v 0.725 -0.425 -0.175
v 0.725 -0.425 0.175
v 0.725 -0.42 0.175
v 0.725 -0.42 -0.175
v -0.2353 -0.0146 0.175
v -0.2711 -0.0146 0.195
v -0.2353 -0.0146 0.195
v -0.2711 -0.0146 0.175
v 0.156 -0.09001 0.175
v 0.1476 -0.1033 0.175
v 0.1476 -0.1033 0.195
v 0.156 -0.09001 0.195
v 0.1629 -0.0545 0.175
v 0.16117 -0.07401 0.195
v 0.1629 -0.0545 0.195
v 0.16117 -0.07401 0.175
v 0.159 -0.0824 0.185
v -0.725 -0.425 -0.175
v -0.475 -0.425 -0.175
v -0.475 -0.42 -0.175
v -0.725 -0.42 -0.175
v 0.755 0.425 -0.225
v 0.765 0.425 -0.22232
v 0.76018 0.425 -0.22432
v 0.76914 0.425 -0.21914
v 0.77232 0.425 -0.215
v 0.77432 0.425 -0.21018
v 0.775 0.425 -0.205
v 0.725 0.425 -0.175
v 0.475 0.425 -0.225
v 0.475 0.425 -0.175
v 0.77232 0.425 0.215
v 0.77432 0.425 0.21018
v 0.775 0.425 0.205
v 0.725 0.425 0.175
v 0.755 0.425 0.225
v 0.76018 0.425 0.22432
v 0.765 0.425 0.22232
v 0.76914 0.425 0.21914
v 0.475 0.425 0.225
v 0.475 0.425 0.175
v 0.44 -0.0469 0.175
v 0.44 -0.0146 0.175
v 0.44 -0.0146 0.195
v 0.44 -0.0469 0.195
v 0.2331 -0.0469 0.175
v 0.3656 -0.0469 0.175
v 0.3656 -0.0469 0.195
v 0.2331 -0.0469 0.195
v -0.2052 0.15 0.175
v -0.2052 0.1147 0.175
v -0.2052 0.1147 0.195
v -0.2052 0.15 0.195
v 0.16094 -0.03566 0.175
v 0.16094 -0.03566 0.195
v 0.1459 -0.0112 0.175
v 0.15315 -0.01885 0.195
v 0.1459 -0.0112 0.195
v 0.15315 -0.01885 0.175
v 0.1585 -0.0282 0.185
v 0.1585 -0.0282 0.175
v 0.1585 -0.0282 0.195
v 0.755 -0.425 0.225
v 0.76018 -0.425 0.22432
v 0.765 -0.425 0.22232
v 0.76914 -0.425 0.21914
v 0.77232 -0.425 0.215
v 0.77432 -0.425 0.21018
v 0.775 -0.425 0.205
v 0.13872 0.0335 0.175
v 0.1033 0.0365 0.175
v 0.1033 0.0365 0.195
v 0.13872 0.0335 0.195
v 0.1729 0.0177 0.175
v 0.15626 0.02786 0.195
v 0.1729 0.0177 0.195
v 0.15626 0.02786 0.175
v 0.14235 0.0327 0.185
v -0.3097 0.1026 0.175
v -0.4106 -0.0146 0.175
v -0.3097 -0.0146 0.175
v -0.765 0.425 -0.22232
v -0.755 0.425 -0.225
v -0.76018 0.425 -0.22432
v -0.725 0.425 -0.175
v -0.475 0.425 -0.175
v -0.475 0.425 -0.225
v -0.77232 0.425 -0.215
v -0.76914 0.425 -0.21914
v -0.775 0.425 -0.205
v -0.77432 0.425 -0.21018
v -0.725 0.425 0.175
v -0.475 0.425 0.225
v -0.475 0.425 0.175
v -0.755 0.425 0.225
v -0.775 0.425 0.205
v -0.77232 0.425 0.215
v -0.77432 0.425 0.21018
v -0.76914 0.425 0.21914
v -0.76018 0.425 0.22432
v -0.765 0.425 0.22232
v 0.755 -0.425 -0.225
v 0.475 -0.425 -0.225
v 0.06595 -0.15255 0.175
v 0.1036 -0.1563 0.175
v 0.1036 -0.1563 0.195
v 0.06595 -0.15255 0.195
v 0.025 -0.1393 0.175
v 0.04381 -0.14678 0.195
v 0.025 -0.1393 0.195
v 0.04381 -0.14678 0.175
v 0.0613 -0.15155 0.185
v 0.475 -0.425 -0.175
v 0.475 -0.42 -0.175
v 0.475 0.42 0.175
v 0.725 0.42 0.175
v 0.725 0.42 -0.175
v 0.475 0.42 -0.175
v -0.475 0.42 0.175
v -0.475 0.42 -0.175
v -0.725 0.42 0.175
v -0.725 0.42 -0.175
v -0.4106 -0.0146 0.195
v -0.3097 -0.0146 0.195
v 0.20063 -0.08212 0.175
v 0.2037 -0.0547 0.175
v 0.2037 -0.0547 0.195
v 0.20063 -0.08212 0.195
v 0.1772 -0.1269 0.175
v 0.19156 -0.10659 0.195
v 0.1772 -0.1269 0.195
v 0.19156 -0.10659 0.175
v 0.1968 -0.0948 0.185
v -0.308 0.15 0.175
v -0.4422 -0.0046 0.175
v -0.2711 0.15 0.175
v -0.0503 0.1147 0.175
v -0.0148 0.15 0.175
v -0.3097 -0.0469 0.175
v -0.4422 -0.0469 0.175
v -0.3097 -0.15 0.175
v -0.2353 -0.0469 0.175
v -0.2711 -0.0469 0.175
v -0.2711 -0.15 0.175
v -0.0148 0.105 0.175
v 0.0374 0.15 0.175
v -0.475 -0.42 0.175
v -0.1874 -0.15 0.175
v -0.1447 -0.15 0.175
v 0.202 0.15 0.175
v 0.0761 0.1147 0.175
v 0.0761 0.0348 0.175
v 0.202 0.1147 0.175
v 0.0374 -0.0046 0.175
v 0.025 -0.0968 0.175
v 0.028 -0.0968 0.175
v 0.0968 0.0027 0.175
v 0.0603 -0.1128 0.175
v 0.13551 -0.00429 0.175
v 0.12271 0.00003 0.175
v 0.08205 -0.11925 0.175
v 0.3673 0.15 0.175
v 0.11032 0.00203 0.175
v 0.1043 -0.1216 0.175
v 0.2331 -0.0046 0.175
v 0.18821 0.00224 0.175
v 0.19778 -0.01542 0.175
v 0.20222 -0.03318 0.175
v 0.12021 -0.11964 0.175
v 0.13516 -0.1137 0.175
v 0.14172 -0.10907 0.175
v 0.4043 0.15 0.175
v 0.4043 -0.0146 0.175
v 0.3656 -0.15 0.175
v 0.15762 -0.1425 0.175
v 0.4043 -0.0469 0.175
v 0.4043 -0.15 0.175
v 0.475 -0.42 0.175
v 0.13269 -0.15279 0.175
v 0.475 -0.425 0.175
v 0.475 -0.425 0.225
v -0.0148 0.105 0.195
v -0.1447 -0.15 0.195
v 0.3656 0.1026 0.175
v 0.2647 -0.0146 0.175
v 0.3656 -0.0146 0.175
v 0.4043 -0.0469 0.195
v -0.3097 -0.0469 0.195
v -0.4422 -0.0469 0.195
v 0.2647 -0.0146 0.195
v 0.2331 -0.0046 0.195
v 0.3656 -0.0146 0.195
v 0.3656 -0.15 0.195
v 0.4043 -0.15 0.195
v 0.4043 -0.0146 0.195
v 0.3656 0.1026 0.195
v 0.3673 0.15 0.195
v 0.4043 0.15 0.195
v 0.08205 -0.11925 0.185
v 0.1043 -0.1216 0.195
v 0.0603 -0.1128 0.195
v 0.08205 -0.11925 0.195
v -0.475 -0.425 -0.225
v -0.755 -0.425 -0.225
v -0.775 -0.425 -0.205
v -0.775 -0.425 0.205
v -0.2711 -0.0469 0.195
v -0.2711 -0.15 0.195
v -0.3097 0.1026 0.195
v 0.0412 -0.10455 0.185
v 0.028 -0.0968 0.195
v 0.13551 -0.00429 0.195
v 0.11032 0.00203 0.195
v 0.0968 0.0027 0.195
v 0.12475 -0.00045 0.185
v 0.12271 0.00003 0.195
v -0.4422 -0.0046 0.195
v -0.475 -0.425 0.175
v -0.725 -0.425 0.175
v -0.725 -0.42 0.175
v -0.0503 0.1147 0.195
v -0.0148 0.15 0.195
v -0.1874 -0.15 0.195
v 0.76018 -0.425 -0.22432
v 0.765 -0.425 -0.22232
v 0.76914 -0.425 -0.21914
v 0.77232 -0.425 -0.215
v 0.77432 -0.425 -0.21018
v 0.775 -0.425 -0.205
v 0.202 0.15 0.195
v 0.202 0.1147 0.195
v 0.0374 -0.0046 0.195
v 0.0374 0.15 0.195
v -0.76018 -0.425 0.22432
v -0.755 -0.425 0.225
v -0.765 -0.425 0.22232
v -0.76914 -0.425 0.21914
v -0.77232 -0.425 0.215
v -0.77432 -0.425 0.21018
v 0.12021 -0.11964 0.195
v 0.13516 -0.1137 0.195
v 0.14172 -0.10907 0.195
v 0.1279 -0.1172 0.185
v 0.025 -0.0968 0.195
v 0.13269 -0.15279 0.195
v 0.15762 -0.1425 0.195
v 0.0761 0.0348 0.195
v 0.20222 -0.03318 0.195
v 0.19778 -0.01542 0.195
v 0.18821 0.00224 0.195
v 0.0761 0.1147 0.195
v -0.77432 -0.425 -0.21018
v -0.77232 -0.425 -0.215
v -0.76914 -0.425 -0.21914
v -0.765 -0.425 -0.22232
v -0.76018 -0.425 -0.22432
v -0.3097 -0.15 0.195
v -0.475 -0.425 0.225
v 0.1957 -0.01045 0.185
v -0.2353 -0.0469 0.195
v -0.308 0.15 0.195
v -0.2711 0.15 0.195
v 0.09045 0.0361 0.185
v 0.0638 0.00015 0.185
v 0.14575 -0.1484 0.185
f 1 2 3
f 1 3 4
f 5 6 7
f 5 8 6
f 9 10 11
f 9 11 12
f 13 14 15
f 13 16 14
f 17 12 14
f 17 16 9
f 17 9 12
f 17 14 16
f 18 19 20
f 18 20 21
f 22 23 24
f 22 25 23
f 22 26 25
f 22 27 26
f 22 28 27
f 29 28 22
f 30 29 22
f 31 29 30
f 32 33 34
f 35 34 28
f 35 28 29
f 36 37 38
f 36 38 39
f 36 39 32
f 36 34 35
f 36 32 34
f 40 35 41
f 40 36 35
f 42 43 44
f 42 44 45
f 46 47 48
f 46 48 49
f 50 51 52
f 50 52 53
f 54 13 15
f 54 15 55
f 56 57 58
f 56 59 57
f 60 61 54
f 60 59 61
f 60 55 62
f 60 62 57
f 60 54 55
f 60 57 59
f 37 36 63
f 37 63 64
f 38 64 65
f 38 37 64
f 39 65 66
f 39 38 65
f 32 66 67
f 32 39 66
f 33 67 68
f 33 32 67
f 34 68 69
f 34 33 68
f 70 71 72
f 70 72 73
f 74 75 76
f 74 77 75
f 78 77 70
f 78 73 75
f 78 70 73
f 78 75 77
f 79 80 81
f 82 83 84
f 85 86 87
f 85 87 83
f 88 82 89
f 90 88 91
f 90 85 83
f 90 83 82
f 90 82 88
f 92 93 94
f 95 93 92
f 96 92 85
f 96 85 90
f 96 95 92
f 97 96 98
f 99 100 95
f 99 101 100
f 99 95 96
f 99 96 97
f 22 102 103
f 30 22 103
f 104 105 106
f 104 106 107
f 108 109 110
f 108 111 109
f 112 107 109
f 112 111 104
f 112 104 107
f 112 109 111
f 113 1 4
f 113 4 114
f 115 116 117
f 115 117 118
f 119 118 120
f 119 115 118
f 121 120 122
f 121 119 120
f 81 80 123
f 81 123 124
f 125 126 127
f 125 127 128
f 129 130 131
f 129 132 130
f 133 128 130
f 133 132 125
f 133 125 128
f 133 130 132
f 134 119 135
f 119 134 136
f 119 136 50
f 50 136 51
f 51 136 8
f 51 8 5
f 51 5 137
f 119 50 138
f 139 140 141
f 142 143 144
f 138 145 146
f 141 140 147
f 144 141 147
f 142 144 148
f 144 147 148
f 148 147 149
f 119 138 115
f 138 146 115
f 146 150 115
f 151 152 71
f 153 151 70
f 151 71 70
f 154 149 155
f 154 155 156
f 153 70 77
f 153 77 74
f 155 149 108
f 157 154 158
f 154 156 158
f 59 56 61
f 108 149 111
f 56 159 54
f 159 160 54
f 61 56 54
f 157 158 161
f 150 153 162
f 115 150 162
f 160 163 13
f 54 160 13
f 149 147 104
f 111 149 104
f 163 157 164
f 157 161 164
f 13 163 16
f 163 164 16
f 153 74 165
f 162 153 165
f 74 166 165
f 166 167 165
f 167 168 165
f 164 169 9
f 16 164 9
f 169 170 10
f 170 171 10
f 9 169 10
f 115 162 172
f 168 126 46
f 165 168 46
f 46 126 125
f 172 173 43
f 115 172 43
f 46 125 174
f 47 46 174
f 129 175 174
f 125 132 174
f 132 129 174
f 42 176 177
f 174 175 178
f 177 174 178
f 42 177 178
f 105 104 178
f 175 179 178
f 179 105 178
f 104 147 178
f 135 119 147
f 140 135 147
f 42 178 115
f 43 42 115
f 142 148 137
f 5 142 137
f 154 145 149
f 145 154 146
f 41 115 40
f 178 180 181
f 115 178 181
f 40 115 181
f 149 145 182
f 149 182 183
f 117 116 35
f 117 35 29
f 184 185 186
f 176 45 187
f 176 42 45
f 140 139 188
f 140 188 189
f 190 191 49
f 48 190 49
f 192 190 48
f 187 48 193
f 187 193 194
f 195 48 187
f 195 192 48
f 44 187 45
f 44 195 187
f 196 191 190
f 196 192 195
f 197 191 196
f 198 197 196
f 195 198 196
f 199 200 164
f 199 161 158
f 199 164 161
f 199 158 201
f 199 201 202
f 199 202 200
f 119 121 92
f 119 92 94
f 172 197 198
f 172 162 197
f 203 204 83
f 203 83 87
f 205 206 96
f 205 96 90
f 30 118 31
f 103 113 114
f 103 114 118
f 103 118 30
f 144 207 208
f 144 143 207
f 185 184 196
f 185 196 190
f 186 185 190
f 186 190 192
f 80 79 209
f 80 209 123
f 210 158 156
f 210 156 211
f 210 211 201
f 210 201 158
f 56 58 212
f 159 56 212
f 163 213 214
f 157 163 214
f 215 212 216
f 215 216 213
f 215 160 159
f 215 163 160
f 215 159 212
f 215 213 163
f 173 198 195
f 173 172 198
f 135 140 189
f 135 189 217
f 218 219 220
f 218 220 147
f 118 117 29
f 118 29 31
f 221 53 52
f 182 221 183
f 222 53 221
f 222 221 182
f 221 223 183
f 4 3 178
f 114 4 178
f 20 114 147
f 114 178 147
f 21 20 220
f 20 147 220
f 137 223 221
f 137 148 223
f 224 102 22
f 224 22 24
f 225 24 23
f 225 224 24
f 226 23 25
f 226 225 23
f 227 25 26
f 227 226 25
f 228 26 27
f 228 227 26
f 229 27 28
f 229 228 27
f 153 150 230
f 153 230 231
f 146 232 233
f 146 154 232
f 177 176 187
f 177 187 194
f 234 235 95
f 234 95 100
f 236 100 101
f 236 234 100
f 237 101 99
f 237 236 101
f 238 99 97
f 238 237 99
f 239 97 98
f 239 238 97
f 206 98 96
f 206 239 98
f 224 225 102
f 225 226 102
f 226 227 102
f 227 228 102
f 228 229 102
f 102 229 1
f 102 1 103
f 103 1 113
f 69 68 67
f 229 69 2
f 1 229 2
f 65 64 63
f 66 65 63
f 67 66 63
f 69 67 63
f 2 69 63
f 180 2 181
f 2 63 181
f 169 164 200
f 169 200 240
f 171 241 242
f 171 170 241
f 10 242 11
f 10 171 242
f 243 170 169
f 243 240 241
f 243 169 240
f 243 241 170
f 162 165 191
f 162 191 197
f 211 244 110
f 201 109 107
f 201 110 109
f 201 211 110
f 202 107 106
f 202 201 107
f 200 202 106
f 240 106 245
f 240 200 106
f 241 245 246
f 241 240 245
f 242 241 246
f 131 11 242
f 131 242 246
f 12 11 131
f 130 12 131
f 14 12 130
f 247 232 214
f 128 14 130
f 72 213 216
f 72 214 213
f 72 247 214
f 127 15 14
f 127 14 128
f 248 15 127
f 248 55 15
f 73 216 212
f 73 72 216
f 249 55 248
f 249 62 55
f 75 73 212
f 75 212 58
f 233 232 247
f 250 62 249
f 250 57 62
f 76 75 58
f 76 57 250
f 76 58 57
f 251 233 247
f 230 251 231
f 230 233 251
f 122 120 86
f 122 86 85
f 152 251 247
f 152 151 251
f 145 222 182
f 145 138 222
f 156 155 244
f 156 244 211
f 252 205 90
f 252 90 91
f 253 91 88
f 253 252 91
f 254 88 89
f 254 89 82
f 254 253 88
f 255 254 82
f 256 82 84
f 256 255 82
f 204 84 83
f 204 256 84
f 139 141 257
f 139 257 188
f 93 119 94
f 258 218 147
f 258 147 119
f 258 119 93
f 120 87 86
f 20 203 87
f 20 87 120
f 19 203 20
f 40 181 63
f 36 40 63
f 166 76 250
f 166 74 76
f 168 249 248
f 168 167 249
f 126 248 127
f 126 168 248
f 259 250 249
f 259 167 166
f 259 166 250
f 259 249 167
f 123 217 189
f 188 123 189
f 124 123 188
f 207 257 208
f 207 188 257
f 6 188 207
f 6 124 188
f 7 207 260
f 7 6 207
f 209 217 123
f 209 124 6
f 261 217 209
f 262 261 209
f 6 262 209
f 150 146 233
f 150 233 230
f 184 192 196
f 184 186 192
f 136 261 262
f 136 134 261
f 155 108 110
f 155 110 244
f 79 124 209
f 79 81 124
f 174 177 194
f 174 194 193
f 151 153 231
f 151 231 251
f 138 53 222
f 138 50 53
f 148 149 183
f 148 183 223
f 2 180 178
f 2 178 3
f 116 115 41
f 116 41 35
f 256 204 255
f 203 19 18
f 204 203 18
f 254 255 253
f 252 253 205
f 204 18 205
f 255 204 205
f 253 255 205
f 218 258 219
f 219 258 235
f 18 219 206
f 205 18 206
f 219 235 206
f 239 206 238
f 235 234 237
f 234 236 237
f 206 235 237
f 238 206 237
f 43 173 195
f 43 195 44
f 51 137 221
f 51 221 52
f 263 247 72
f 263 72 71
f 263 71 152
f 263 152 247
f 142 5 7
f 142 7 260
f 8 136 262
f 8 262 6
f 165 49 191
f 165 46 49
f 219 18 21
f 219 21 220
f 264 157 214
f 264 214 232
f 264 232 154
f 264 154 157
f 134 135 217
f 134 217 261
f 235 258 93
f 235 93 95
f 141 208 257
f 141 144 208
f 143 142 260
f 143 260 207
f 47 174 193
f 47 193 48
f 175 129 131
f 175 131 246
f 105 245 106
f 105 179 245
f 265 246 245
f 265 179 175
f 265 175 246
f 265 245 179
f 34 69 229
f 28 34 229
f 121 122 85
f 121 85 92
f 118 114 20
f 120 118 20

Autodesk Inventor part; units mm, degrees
ref_plane "YZ Plane" through (0, 0, 0) normal (1, 0, 0) x (0, 1, 0)
ref_plane "XZ Plane" through (0, 0, 0) normal (0, 1, 0) x (-1, 0, 0)
ref_plane "XY Plane" through (0, 0, 0) normal (0, 0, 1) x (1, 0, 0)
sketch "Sketch1" plane through (0, 0, 0) normal (0, 1, 0) x (-1, 0, 0)
  line L0 (0.725, 0.175) -> (-0.725, 0.175)
  line L1 (-0.725, 0.175) -> (-0.725, -0.175)
  line L2 (-0.725, -0.175) -> (0.725, -0.175)
  line L3 (0.725, -0.175) -> (0.725, 0.175)
  line L4 (0.475, 0.175) -> (0.475, 0.225)
  line L5 (0.475, 0.225) -> (0.775, 0.225)
  line L6 (0.775, 0.225) -> (0.775, -0.225)
  line L7 (0.775, -0.225) -> (0.475, -0.225)
  line L8 (0.475, -0.225) -> (0.475, -0.175)
  line L9 (-0.475, 0.175) -> (-0.475, 0.225)
  line L10 (-0.475, 0.225) -> (-0.775, 0.225)
  line L11 (-0.775, 0.225) -> (-0.775, -0.225)
  line L12 (-0.775, -0.225) -> (-0.475, -0.225)
  line L13 (-0.475, -0.175) -> (-0.475, -0.225)
  line L14 (0.475, 0.175) -> (-0.475, 0.175)
  point P0 (0, 0)
  point P1 (0, 0.175)
  point P2 (0.725, 0)
  dimension "d0" = 1.55
  dimension "d1" = 0.05
  dimension "d2" = 0.05
  dimension "d3" = 0.45
  dimension "d4" = 0.3
extrude "Extrusion1" add sketch "Sketch1" along normal mid plane 0.85 contours L0 L4 L5 L6 L7 L8 L2 L3 | L0 L1 L2 L13 L12 L11 L10 L9
extrude "Extrusion2" add sketch "Sketch1" along normal mid plane 0.84 contours L3 L2 L1 L0
sketch "Sketch2" plane through (-0.475, -0.42, 0.175) normal (0, 0, 1) x (1, 0, 0)
  line L0 (0, 0) -> (0, 0.84) projected
  line L1 (0.95, 0) -> (0, 0) projected
  line L2 (0.95, 0) -> (0.95, 0.84) projected
  line L3 (0, 0.84) -> (0.95, 0.84) projected
  line L4 (0, 0.42) -> (0.95, 0.42) construction
  line L5 (0.2397, 0.3731) -> (0.2039, 0.3731)
  line L6 (0.2039, 0.3731) -> (0.2039, 0.27)
  line L7 (0.2039, 0.27) -> (0.1653, 0.27)
  line L8 (0.1653, 0.27) -> (0.1653, 0.3731)
  line L9 (0.1653, 0.3731) -> (0.0328, 0.3731)
  line L10 (0.0328, 0.3731) -> (0.0328, 0.4154)
  line L11 (0.0328, 0.4154) -> (0.167, 0.57)
  line L12 (0.167, 0.57) -> (0.2039, 0.57)
  line L13 (0.2039, 0.57) -> (0.2039, 0.4054)
  line L14 (0.2039, 0.4054) -> (0.2397, 0.4054)
  line L15 (0.2397, 0.4054) -> (0.2397, 0.3731)
  line L16 (0.1653, 0.4054) -> (0.1653, 0.5226)
  line L17 (0.1653, 0.5226) -> (0.0644, 0.4054)
  line L18 (0.0644, 0.4054) -> (0.1653, 0.4054)
  line L19 (0.4602, 0.525) -> (0.3303, 0.27)
  line L20 (0.3303, 0.27) -> (0.2876, 0.27)
  line L21 (0.2876, 0.27) -> (0.4247, 0.5347)
  line L22 (0.4247, 0.5347) -> (0.2698, 0.5347)
  line L23 (0.2698, 0.5347) -> (0.2698, 0.57)
  line L24 (0.2698, 0.57) -> (0.4602, 0.57)
  line L25 (0.4602, 0.57) -> (0.4602, 0.525)
  spline S0 degree 2 poles (0.6787, 0.3653) (0.6787, 0.3437) (0.6649, 0.3067) (0.6522, 0.2931) knots 0 0 0 1 2 2 2
  spline S1 degree 2 poles (0.6522, 0.2931) (0.6396, 0.2795) (0.6019, 0.2637) (0.5786, 0.2637) knots 0 0 0 1 2 2 2
  spline S2 degree 2 poles (0.5786, 0.2637) (0.5572, 0.2637) (0.5154, 0.2732) (0.5, 0.2807) knots 0 0 0 1 2 2 2
  line L26 (0.5, 0.2807) -> (0.5, 0.3232)
  line L27 (0.5, 0.3232) -> (0.503, 0.3232)
  spline S3 degree 2 poles (0.503, 0.3232) (0.5076, 0.3198) (0.5248, 0.3111) (0.5353, 0.3072) knots 0 0 0 1 2 2 2
  spline S4 degree 2 poles (0.5353, 0.3072) (0.5472, 0.3031) (0.5669, 0.2984) (0.5793, 0.2984) knots 0 0 0 1 2 2 2
  spline S5 degree 2 poles (0.5793, 0.2984) (0.5915, 0.2984) (0.6143, 0.3072) (0.6226, 0.3167) knots 0 0 0 1 2 2 2
  spline S6 degree 2 poles (0.6226, 0.3167) (0.6301, 0.3257) (0.6379, 0.3495) (0.6379, 0.3655) knots 0 0 0 1 2 2 2
  spline S7 degree 2 poles (0.6379, 0.3655) (0.6379, 0.3816) (0.6291, 0.402) (0.6209, 0.4088) knots 0 0 0 1 2 2 2
  spline S8 degree 2 poles (0.6209, 0.4088) (0.6124, 0.4164) (0.5871, 0.4227) (0.5718, 0.4227) knots 0 0 0 1 2 2 2
  spline S9 degree 2 poles (0.5718, 0.4227) (0.5552, 0.4227) (0.5224, 0.4176) (0.5124, 0.4154) knots 0 0 0 1 2 2 2
  line L28 (0.5124, 0.4154) -> (0.5124, 0.57)
  line L29 (0.5124, 0.57) -> (0.677, 0.57)
  line L30 (0.677, 0.57) -> (0.677, 0.5347)
  line L31 (0.677, 0.5347) -> (0.5511, 0.5347)
  line L32 (0.5511, 0.5347) -> (0.5511, 0.4548)
  spline S10 degree 2 poles (0.5511, 0.4548) (0.5584, 0.4557) (0.5725, 0.4565) (0.5783, 0.4565) knots 0 0 0 1 2 2 2
  spline S11 degree 2 poles (0.5783, 0.4565) (0.6014, 0.4565) (0.6333, 0.4489) (0.6479, 0.4377) knots 0 0 0 1 2 2 2
  spline S12 degree 2 poles (0.6479, 0.4377) (0.6627, 0.4266) (0.6787, 0.3925) (0.6787, 0.3653) knots 0 0 0 1 2 2 2
  line L33 (0.915, 0.3731) -> (0.8793, 0.3731)
  line L34 (0.8793, 0.3731) -> (0.8793, 0.27)
  line L35 (0.8793, 0.27) -> (0.8406, 0.27)
  line L36 (0.8406, 0.27) -> (0.8406, 0.3731)
  line L37 (0.8406, 0.3731) -> (0.7081, 0.3731)
  line L38 (0.7081, 0.3731) -> (0.7081, 0.4154)
  line L39 (0.7081, 0.4154) -> (0.8423, 0.57)
  line L40 (0.8423, 0.57) -> (0.8793, 0.57)
  line L41 (0.8793, 0.57) -> (0.8793, 0.4054)
  line L42 (0.8793, 0.4054) -> (0.915, 0.4054)
  line L43 (0.915, 0.4054) -> (0.915, 0.3731)
  line L44 (0.8406, 0.4054) -> (0.8406, 0.5226)
  line L45 (0.8406, 0.5226) -> (0.7397, 0.4054)
  line L46 (0.7397, 0.4054) -> (0.8406, 0.4054)
  point P0 (0.475, 0.42)
extrude "Extrusion3" add sketch "Sketch2" along normal blind 0.02 contours L5 L6 L7 L8 L9 L10 L11 L12 L13 L14 L15 | L19 L20 L21 L22 L23 L24 L25 | S0 S1 S2 L26 L27 S3 S4 S5 S6 S7 S8 S9 L28 L29 L30 L31 L32 S10 S11 S12 | L33 L34 L35 L36 L37 L38 L39 L40 L41 L42 L43
fillet "Fillet1" radius 0.02 4 edges at (-0.775, 0, 0.225) (-0.775, 0, -0.225) (0.775, 0, 0.225) (0.775, 0, -0.225)
equation "\"d2\" = d1"
properties part number "21-1001" material "Copper"
